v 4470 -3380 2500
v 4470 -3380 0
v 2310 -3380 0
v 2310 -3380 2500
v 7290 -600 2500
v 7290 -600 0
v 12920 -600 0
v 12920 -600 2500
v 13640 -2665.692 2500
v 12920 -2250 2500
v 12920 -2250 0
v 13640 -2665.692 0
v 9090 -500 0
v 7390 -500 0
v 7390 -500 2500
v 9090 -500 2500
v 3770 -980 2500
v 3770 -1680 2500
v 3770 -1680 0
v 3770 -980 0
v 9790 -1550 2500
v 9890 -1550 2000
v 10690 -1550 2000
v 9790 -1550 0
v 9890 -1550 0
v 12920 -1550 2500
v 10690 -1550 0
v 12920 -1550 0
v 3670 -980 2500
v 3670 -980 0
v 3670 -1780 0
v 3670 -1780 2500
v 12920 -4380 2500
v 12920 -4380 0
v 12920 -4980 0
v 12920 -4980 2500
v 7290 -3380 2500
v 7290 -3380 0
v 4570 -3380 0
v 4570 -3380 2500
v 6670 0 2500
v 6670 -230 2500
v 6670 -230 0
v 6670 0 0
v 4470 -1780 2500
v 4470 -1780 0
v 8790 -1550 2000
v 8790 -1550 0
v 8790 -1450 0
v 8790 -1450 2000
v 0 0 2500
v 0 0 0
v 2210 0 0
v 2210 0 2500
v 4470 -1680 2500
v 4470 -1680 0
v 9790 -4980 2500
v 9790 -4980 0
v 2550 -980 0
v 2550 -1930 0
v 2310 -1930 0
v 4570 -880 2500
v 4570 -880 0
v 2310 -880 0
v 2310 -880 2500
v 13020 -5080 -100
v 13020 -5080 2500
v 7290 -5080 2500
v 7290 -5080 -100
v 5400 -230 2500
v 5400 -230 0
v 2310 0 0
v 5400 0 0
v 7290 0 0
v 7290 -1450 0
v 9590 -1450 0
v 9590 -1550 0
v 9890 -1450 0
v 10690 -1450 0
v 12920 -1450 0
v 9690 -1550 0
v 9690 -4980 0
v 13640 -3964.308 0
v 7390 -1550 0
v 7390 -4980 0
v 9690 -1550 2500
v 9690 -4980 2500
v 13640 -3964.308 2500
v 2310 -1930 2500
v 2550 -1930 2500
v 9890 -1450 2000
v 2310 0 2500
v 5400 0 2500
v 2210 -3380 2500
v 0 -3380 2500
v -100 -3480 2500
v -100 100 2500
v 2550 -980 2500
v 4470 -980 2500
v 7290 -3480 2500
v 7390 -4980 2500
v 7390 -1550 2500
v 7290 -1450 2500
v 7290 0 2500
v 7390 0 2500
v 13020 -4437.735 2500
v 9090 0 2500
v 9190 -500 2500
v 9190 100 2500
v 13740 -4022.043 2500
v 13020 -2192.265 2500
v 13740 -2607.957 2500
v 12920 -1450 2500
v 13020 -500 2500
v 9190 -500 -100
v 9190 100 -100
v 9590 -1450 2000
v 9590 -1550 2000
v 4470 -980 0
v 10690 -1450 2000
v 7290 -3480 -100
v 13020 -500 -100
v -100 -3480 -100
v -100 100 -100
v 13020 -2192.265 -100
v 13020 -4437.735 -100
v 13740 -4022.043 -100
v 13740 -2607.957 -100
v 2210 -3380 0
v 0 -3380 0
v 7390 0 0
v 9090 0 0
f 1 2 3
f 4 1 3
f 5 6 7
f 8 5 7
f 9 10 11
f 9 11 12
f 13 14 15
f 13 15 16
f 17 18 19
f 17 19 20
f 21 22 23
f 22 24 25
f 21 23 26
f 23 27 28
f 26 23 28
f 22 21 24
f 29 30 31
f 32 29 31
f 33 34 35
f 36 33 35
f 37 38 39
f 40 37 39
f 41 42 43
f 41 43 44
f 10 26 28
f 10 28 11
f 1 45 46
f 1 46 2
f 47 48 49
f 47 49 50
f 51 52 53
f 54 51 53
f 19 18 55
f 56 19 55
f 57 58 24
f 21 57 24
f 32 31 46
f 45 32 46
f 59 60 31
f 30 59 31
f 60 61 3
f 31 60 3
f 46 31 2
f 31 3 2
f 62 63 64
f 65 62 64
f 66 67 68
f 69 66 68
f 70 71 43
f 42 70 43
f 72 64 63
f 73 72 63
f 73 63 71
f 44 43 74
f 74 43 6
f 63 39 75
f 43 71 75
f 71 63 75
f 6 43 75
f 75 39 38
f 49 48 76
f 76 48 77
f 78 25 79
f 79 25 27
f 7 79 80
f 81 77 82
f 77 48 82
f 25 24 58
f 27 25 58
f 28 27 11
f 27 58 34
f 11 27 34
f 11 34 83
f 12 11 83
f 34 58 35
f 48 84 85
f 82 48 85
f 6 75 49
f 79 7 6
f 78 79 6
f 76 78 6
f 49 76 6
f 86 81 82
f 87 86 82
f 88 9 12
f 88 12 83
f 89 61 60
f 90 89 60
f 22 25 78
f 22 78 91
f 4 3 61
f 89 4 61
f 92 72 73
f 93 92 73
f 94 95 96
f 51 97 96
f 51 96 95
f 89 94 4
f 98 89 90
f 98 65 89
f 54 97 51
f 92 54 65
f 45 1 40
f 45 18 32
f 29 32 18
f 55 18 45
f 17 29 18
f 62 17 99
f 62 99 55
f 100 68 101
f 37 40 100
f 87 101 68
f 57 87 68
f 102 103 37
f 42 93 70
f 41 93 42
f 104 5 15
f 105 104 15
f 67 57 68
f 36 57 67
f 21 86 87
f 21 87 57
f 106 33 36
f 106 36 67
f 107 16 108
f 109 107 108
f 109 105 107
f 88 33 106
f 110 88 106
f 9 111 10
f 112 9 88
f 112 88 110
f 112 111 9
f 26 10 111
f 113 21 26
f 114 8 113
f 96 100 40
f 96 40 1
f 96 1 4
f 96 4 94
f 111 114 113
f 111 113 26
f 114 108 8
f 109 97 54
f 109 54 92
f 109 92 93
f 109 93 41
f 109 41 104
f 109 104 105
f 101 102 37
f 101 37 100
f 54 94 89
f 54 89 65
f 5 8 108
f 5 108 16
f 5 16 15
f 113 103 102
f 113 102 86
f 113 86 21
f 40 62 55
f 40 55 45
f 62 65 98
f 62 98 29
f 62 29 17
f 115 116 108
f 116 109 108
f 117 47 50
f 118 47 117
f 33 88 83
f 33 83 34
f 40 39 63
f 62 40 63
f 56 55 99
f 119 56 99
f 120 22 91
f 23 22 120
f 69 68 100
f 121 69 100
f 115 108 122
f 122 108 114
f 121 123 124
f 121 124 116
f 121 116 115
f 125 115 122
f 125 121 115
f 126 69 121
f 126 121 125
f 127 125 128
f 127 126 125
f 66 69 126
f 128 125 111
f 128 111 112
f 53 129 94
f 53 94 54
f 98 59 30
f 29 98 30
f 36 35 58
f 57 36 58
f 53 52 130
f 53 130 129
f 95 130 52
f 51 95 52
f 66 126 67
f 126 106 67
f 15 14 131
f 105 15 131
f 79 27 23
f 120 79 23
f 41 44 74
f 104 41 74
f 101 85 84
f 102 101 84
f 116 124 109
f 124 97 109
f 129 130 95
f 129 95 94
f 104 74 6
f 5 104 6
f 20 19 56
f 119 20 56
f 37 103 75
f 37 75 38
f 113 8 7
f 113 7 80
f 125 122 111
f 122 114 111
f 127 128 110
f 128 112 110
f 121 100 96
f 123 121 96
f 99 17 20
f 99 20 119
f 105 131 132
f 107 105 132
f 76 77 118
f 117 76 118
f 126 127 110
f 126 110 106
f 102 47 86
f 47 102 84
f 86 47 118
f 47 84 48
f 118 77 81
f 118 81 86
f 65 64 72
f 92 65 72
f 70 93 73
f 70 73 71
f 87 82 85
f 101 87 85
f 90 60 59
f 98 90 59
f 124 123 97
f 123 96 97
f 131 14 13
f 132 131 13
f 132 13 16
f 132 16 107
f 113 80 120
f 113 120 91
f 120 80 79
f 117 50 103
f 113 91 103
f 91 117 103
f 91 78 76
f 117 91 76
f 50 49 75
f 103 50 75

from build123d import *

# Parameters (mm, degrees)
F0_W     = 2210
F0_H     = 3380
F0_W_2   = 700
F0_H_2   = 700
F0_W_3   = 1700
F0_H_3   = 500
F1_DEPTH = 2500
F3_DEPTH = 100
F4_W     = 800
F4_H     = 2000
F5_DEPTH = 100


with BuildPart() as f1:
    # F0 (on Top) → F1 (new body)
    with BuildSketch(Plane.XY):
        Polygon((7390, 100), (-100, 100), (-100, -3480), (7290, -3480), (7290, -5080), (10190, -5080), (13020, -5080), (13020, -4980), (13020, -4437.735027), (13740, -4022.042833), (13740, -2607.957167), (13020, -2192.264973), (13020, -1550), (13020, -500), (12720, -500), (9190, -500), (9190, 100), align=None)
        Polygon((7390, -4980), (7390, -3480), (7390, -1550), (9690, -1550), (9690, -4980), (9590, -4980), (7890, -4980), align=None, mode=Mode.SUBTRACT)
        Polygon((10090, -1550), (10190, -1550), (12720, -1550), (12920, -1550), (12920, -2250), (13640, -2665.692194), (13640, -3964.307806), (12920, -4380), (12920, -4980), (12210, -4980), (10890, -4980), (10190, -4980), (10090, -4980), (9790, -4980), (9790, -1550), align=None, mode=Mode.SUBTRACT)
        with Locations((1105, -1690)):
            Rectangle(F0_W, F0_H, mode=Mode.SUBTRACT)
        Polygon((4470, -3380), (2310, -3380), (2310, -1930), (2550, -1930), (2550, -980), (3670, -980), (3670, -1780), (4470, -1780), align=None, mode=Mode.SUBTRACT)
        with Locations((4120, -1330)):
            Rectangle(F0_W_2, F0_H_2, mode=Mode.SUBTRACT)
        Polygon((7290, 0), (7290, -600), (7390, -600), (12620, -600), (12920, -600), (12920, -1450), (12620, -1450), (10190, -1450), (7390, -1450), (7290, -1450), (7290, -1550), (7290, -3380), (4570, -3380), (4570, -880), (2310, -880), (2310, 0), (5400, 0), (5400, -230), (6670, -230), (6670, 0), align=None, mode=Mode.SUBTRACT)
        with Locations((8240, -250)):
            Rectangle(F0_W_3, F0_H_3, mode=Mode.SUBTRACT)
    extrude(amount=F1_DEPTH)

    # F2 (on face) → F3 (join)
    with BuildSketch(Plane(origin=(0, 0, 0), x_dir=(1, 0, 0), z_dir=(0, 0, -1))):
        Polygon((7290, 3480), (-100, 3480), (-100, -100), (9190, -100), (9190, 500), (13020, 500), (13020, 2192.264973), (13740, 2607.957167), (13740, 4022.042833), (13020, 4437.735027), (13020, 5080), (7290, 5080), align=None)
    extrude(amount=F3_DEPTH)

    # F4 (on face) → F5 (cut, through all)
    with BuildSketch(Plane.XZ.offset(1550)):
        with Locations((10290, 1000)):
            Rectangle(F4_W, F4_H)
        with Locations((9190, 1000)):
            Rectangle(F4_W, F4_H)
    extrude(amount=-F5_DEPTH, mode=Mode.SUBTRACT)


solid = f1.part
